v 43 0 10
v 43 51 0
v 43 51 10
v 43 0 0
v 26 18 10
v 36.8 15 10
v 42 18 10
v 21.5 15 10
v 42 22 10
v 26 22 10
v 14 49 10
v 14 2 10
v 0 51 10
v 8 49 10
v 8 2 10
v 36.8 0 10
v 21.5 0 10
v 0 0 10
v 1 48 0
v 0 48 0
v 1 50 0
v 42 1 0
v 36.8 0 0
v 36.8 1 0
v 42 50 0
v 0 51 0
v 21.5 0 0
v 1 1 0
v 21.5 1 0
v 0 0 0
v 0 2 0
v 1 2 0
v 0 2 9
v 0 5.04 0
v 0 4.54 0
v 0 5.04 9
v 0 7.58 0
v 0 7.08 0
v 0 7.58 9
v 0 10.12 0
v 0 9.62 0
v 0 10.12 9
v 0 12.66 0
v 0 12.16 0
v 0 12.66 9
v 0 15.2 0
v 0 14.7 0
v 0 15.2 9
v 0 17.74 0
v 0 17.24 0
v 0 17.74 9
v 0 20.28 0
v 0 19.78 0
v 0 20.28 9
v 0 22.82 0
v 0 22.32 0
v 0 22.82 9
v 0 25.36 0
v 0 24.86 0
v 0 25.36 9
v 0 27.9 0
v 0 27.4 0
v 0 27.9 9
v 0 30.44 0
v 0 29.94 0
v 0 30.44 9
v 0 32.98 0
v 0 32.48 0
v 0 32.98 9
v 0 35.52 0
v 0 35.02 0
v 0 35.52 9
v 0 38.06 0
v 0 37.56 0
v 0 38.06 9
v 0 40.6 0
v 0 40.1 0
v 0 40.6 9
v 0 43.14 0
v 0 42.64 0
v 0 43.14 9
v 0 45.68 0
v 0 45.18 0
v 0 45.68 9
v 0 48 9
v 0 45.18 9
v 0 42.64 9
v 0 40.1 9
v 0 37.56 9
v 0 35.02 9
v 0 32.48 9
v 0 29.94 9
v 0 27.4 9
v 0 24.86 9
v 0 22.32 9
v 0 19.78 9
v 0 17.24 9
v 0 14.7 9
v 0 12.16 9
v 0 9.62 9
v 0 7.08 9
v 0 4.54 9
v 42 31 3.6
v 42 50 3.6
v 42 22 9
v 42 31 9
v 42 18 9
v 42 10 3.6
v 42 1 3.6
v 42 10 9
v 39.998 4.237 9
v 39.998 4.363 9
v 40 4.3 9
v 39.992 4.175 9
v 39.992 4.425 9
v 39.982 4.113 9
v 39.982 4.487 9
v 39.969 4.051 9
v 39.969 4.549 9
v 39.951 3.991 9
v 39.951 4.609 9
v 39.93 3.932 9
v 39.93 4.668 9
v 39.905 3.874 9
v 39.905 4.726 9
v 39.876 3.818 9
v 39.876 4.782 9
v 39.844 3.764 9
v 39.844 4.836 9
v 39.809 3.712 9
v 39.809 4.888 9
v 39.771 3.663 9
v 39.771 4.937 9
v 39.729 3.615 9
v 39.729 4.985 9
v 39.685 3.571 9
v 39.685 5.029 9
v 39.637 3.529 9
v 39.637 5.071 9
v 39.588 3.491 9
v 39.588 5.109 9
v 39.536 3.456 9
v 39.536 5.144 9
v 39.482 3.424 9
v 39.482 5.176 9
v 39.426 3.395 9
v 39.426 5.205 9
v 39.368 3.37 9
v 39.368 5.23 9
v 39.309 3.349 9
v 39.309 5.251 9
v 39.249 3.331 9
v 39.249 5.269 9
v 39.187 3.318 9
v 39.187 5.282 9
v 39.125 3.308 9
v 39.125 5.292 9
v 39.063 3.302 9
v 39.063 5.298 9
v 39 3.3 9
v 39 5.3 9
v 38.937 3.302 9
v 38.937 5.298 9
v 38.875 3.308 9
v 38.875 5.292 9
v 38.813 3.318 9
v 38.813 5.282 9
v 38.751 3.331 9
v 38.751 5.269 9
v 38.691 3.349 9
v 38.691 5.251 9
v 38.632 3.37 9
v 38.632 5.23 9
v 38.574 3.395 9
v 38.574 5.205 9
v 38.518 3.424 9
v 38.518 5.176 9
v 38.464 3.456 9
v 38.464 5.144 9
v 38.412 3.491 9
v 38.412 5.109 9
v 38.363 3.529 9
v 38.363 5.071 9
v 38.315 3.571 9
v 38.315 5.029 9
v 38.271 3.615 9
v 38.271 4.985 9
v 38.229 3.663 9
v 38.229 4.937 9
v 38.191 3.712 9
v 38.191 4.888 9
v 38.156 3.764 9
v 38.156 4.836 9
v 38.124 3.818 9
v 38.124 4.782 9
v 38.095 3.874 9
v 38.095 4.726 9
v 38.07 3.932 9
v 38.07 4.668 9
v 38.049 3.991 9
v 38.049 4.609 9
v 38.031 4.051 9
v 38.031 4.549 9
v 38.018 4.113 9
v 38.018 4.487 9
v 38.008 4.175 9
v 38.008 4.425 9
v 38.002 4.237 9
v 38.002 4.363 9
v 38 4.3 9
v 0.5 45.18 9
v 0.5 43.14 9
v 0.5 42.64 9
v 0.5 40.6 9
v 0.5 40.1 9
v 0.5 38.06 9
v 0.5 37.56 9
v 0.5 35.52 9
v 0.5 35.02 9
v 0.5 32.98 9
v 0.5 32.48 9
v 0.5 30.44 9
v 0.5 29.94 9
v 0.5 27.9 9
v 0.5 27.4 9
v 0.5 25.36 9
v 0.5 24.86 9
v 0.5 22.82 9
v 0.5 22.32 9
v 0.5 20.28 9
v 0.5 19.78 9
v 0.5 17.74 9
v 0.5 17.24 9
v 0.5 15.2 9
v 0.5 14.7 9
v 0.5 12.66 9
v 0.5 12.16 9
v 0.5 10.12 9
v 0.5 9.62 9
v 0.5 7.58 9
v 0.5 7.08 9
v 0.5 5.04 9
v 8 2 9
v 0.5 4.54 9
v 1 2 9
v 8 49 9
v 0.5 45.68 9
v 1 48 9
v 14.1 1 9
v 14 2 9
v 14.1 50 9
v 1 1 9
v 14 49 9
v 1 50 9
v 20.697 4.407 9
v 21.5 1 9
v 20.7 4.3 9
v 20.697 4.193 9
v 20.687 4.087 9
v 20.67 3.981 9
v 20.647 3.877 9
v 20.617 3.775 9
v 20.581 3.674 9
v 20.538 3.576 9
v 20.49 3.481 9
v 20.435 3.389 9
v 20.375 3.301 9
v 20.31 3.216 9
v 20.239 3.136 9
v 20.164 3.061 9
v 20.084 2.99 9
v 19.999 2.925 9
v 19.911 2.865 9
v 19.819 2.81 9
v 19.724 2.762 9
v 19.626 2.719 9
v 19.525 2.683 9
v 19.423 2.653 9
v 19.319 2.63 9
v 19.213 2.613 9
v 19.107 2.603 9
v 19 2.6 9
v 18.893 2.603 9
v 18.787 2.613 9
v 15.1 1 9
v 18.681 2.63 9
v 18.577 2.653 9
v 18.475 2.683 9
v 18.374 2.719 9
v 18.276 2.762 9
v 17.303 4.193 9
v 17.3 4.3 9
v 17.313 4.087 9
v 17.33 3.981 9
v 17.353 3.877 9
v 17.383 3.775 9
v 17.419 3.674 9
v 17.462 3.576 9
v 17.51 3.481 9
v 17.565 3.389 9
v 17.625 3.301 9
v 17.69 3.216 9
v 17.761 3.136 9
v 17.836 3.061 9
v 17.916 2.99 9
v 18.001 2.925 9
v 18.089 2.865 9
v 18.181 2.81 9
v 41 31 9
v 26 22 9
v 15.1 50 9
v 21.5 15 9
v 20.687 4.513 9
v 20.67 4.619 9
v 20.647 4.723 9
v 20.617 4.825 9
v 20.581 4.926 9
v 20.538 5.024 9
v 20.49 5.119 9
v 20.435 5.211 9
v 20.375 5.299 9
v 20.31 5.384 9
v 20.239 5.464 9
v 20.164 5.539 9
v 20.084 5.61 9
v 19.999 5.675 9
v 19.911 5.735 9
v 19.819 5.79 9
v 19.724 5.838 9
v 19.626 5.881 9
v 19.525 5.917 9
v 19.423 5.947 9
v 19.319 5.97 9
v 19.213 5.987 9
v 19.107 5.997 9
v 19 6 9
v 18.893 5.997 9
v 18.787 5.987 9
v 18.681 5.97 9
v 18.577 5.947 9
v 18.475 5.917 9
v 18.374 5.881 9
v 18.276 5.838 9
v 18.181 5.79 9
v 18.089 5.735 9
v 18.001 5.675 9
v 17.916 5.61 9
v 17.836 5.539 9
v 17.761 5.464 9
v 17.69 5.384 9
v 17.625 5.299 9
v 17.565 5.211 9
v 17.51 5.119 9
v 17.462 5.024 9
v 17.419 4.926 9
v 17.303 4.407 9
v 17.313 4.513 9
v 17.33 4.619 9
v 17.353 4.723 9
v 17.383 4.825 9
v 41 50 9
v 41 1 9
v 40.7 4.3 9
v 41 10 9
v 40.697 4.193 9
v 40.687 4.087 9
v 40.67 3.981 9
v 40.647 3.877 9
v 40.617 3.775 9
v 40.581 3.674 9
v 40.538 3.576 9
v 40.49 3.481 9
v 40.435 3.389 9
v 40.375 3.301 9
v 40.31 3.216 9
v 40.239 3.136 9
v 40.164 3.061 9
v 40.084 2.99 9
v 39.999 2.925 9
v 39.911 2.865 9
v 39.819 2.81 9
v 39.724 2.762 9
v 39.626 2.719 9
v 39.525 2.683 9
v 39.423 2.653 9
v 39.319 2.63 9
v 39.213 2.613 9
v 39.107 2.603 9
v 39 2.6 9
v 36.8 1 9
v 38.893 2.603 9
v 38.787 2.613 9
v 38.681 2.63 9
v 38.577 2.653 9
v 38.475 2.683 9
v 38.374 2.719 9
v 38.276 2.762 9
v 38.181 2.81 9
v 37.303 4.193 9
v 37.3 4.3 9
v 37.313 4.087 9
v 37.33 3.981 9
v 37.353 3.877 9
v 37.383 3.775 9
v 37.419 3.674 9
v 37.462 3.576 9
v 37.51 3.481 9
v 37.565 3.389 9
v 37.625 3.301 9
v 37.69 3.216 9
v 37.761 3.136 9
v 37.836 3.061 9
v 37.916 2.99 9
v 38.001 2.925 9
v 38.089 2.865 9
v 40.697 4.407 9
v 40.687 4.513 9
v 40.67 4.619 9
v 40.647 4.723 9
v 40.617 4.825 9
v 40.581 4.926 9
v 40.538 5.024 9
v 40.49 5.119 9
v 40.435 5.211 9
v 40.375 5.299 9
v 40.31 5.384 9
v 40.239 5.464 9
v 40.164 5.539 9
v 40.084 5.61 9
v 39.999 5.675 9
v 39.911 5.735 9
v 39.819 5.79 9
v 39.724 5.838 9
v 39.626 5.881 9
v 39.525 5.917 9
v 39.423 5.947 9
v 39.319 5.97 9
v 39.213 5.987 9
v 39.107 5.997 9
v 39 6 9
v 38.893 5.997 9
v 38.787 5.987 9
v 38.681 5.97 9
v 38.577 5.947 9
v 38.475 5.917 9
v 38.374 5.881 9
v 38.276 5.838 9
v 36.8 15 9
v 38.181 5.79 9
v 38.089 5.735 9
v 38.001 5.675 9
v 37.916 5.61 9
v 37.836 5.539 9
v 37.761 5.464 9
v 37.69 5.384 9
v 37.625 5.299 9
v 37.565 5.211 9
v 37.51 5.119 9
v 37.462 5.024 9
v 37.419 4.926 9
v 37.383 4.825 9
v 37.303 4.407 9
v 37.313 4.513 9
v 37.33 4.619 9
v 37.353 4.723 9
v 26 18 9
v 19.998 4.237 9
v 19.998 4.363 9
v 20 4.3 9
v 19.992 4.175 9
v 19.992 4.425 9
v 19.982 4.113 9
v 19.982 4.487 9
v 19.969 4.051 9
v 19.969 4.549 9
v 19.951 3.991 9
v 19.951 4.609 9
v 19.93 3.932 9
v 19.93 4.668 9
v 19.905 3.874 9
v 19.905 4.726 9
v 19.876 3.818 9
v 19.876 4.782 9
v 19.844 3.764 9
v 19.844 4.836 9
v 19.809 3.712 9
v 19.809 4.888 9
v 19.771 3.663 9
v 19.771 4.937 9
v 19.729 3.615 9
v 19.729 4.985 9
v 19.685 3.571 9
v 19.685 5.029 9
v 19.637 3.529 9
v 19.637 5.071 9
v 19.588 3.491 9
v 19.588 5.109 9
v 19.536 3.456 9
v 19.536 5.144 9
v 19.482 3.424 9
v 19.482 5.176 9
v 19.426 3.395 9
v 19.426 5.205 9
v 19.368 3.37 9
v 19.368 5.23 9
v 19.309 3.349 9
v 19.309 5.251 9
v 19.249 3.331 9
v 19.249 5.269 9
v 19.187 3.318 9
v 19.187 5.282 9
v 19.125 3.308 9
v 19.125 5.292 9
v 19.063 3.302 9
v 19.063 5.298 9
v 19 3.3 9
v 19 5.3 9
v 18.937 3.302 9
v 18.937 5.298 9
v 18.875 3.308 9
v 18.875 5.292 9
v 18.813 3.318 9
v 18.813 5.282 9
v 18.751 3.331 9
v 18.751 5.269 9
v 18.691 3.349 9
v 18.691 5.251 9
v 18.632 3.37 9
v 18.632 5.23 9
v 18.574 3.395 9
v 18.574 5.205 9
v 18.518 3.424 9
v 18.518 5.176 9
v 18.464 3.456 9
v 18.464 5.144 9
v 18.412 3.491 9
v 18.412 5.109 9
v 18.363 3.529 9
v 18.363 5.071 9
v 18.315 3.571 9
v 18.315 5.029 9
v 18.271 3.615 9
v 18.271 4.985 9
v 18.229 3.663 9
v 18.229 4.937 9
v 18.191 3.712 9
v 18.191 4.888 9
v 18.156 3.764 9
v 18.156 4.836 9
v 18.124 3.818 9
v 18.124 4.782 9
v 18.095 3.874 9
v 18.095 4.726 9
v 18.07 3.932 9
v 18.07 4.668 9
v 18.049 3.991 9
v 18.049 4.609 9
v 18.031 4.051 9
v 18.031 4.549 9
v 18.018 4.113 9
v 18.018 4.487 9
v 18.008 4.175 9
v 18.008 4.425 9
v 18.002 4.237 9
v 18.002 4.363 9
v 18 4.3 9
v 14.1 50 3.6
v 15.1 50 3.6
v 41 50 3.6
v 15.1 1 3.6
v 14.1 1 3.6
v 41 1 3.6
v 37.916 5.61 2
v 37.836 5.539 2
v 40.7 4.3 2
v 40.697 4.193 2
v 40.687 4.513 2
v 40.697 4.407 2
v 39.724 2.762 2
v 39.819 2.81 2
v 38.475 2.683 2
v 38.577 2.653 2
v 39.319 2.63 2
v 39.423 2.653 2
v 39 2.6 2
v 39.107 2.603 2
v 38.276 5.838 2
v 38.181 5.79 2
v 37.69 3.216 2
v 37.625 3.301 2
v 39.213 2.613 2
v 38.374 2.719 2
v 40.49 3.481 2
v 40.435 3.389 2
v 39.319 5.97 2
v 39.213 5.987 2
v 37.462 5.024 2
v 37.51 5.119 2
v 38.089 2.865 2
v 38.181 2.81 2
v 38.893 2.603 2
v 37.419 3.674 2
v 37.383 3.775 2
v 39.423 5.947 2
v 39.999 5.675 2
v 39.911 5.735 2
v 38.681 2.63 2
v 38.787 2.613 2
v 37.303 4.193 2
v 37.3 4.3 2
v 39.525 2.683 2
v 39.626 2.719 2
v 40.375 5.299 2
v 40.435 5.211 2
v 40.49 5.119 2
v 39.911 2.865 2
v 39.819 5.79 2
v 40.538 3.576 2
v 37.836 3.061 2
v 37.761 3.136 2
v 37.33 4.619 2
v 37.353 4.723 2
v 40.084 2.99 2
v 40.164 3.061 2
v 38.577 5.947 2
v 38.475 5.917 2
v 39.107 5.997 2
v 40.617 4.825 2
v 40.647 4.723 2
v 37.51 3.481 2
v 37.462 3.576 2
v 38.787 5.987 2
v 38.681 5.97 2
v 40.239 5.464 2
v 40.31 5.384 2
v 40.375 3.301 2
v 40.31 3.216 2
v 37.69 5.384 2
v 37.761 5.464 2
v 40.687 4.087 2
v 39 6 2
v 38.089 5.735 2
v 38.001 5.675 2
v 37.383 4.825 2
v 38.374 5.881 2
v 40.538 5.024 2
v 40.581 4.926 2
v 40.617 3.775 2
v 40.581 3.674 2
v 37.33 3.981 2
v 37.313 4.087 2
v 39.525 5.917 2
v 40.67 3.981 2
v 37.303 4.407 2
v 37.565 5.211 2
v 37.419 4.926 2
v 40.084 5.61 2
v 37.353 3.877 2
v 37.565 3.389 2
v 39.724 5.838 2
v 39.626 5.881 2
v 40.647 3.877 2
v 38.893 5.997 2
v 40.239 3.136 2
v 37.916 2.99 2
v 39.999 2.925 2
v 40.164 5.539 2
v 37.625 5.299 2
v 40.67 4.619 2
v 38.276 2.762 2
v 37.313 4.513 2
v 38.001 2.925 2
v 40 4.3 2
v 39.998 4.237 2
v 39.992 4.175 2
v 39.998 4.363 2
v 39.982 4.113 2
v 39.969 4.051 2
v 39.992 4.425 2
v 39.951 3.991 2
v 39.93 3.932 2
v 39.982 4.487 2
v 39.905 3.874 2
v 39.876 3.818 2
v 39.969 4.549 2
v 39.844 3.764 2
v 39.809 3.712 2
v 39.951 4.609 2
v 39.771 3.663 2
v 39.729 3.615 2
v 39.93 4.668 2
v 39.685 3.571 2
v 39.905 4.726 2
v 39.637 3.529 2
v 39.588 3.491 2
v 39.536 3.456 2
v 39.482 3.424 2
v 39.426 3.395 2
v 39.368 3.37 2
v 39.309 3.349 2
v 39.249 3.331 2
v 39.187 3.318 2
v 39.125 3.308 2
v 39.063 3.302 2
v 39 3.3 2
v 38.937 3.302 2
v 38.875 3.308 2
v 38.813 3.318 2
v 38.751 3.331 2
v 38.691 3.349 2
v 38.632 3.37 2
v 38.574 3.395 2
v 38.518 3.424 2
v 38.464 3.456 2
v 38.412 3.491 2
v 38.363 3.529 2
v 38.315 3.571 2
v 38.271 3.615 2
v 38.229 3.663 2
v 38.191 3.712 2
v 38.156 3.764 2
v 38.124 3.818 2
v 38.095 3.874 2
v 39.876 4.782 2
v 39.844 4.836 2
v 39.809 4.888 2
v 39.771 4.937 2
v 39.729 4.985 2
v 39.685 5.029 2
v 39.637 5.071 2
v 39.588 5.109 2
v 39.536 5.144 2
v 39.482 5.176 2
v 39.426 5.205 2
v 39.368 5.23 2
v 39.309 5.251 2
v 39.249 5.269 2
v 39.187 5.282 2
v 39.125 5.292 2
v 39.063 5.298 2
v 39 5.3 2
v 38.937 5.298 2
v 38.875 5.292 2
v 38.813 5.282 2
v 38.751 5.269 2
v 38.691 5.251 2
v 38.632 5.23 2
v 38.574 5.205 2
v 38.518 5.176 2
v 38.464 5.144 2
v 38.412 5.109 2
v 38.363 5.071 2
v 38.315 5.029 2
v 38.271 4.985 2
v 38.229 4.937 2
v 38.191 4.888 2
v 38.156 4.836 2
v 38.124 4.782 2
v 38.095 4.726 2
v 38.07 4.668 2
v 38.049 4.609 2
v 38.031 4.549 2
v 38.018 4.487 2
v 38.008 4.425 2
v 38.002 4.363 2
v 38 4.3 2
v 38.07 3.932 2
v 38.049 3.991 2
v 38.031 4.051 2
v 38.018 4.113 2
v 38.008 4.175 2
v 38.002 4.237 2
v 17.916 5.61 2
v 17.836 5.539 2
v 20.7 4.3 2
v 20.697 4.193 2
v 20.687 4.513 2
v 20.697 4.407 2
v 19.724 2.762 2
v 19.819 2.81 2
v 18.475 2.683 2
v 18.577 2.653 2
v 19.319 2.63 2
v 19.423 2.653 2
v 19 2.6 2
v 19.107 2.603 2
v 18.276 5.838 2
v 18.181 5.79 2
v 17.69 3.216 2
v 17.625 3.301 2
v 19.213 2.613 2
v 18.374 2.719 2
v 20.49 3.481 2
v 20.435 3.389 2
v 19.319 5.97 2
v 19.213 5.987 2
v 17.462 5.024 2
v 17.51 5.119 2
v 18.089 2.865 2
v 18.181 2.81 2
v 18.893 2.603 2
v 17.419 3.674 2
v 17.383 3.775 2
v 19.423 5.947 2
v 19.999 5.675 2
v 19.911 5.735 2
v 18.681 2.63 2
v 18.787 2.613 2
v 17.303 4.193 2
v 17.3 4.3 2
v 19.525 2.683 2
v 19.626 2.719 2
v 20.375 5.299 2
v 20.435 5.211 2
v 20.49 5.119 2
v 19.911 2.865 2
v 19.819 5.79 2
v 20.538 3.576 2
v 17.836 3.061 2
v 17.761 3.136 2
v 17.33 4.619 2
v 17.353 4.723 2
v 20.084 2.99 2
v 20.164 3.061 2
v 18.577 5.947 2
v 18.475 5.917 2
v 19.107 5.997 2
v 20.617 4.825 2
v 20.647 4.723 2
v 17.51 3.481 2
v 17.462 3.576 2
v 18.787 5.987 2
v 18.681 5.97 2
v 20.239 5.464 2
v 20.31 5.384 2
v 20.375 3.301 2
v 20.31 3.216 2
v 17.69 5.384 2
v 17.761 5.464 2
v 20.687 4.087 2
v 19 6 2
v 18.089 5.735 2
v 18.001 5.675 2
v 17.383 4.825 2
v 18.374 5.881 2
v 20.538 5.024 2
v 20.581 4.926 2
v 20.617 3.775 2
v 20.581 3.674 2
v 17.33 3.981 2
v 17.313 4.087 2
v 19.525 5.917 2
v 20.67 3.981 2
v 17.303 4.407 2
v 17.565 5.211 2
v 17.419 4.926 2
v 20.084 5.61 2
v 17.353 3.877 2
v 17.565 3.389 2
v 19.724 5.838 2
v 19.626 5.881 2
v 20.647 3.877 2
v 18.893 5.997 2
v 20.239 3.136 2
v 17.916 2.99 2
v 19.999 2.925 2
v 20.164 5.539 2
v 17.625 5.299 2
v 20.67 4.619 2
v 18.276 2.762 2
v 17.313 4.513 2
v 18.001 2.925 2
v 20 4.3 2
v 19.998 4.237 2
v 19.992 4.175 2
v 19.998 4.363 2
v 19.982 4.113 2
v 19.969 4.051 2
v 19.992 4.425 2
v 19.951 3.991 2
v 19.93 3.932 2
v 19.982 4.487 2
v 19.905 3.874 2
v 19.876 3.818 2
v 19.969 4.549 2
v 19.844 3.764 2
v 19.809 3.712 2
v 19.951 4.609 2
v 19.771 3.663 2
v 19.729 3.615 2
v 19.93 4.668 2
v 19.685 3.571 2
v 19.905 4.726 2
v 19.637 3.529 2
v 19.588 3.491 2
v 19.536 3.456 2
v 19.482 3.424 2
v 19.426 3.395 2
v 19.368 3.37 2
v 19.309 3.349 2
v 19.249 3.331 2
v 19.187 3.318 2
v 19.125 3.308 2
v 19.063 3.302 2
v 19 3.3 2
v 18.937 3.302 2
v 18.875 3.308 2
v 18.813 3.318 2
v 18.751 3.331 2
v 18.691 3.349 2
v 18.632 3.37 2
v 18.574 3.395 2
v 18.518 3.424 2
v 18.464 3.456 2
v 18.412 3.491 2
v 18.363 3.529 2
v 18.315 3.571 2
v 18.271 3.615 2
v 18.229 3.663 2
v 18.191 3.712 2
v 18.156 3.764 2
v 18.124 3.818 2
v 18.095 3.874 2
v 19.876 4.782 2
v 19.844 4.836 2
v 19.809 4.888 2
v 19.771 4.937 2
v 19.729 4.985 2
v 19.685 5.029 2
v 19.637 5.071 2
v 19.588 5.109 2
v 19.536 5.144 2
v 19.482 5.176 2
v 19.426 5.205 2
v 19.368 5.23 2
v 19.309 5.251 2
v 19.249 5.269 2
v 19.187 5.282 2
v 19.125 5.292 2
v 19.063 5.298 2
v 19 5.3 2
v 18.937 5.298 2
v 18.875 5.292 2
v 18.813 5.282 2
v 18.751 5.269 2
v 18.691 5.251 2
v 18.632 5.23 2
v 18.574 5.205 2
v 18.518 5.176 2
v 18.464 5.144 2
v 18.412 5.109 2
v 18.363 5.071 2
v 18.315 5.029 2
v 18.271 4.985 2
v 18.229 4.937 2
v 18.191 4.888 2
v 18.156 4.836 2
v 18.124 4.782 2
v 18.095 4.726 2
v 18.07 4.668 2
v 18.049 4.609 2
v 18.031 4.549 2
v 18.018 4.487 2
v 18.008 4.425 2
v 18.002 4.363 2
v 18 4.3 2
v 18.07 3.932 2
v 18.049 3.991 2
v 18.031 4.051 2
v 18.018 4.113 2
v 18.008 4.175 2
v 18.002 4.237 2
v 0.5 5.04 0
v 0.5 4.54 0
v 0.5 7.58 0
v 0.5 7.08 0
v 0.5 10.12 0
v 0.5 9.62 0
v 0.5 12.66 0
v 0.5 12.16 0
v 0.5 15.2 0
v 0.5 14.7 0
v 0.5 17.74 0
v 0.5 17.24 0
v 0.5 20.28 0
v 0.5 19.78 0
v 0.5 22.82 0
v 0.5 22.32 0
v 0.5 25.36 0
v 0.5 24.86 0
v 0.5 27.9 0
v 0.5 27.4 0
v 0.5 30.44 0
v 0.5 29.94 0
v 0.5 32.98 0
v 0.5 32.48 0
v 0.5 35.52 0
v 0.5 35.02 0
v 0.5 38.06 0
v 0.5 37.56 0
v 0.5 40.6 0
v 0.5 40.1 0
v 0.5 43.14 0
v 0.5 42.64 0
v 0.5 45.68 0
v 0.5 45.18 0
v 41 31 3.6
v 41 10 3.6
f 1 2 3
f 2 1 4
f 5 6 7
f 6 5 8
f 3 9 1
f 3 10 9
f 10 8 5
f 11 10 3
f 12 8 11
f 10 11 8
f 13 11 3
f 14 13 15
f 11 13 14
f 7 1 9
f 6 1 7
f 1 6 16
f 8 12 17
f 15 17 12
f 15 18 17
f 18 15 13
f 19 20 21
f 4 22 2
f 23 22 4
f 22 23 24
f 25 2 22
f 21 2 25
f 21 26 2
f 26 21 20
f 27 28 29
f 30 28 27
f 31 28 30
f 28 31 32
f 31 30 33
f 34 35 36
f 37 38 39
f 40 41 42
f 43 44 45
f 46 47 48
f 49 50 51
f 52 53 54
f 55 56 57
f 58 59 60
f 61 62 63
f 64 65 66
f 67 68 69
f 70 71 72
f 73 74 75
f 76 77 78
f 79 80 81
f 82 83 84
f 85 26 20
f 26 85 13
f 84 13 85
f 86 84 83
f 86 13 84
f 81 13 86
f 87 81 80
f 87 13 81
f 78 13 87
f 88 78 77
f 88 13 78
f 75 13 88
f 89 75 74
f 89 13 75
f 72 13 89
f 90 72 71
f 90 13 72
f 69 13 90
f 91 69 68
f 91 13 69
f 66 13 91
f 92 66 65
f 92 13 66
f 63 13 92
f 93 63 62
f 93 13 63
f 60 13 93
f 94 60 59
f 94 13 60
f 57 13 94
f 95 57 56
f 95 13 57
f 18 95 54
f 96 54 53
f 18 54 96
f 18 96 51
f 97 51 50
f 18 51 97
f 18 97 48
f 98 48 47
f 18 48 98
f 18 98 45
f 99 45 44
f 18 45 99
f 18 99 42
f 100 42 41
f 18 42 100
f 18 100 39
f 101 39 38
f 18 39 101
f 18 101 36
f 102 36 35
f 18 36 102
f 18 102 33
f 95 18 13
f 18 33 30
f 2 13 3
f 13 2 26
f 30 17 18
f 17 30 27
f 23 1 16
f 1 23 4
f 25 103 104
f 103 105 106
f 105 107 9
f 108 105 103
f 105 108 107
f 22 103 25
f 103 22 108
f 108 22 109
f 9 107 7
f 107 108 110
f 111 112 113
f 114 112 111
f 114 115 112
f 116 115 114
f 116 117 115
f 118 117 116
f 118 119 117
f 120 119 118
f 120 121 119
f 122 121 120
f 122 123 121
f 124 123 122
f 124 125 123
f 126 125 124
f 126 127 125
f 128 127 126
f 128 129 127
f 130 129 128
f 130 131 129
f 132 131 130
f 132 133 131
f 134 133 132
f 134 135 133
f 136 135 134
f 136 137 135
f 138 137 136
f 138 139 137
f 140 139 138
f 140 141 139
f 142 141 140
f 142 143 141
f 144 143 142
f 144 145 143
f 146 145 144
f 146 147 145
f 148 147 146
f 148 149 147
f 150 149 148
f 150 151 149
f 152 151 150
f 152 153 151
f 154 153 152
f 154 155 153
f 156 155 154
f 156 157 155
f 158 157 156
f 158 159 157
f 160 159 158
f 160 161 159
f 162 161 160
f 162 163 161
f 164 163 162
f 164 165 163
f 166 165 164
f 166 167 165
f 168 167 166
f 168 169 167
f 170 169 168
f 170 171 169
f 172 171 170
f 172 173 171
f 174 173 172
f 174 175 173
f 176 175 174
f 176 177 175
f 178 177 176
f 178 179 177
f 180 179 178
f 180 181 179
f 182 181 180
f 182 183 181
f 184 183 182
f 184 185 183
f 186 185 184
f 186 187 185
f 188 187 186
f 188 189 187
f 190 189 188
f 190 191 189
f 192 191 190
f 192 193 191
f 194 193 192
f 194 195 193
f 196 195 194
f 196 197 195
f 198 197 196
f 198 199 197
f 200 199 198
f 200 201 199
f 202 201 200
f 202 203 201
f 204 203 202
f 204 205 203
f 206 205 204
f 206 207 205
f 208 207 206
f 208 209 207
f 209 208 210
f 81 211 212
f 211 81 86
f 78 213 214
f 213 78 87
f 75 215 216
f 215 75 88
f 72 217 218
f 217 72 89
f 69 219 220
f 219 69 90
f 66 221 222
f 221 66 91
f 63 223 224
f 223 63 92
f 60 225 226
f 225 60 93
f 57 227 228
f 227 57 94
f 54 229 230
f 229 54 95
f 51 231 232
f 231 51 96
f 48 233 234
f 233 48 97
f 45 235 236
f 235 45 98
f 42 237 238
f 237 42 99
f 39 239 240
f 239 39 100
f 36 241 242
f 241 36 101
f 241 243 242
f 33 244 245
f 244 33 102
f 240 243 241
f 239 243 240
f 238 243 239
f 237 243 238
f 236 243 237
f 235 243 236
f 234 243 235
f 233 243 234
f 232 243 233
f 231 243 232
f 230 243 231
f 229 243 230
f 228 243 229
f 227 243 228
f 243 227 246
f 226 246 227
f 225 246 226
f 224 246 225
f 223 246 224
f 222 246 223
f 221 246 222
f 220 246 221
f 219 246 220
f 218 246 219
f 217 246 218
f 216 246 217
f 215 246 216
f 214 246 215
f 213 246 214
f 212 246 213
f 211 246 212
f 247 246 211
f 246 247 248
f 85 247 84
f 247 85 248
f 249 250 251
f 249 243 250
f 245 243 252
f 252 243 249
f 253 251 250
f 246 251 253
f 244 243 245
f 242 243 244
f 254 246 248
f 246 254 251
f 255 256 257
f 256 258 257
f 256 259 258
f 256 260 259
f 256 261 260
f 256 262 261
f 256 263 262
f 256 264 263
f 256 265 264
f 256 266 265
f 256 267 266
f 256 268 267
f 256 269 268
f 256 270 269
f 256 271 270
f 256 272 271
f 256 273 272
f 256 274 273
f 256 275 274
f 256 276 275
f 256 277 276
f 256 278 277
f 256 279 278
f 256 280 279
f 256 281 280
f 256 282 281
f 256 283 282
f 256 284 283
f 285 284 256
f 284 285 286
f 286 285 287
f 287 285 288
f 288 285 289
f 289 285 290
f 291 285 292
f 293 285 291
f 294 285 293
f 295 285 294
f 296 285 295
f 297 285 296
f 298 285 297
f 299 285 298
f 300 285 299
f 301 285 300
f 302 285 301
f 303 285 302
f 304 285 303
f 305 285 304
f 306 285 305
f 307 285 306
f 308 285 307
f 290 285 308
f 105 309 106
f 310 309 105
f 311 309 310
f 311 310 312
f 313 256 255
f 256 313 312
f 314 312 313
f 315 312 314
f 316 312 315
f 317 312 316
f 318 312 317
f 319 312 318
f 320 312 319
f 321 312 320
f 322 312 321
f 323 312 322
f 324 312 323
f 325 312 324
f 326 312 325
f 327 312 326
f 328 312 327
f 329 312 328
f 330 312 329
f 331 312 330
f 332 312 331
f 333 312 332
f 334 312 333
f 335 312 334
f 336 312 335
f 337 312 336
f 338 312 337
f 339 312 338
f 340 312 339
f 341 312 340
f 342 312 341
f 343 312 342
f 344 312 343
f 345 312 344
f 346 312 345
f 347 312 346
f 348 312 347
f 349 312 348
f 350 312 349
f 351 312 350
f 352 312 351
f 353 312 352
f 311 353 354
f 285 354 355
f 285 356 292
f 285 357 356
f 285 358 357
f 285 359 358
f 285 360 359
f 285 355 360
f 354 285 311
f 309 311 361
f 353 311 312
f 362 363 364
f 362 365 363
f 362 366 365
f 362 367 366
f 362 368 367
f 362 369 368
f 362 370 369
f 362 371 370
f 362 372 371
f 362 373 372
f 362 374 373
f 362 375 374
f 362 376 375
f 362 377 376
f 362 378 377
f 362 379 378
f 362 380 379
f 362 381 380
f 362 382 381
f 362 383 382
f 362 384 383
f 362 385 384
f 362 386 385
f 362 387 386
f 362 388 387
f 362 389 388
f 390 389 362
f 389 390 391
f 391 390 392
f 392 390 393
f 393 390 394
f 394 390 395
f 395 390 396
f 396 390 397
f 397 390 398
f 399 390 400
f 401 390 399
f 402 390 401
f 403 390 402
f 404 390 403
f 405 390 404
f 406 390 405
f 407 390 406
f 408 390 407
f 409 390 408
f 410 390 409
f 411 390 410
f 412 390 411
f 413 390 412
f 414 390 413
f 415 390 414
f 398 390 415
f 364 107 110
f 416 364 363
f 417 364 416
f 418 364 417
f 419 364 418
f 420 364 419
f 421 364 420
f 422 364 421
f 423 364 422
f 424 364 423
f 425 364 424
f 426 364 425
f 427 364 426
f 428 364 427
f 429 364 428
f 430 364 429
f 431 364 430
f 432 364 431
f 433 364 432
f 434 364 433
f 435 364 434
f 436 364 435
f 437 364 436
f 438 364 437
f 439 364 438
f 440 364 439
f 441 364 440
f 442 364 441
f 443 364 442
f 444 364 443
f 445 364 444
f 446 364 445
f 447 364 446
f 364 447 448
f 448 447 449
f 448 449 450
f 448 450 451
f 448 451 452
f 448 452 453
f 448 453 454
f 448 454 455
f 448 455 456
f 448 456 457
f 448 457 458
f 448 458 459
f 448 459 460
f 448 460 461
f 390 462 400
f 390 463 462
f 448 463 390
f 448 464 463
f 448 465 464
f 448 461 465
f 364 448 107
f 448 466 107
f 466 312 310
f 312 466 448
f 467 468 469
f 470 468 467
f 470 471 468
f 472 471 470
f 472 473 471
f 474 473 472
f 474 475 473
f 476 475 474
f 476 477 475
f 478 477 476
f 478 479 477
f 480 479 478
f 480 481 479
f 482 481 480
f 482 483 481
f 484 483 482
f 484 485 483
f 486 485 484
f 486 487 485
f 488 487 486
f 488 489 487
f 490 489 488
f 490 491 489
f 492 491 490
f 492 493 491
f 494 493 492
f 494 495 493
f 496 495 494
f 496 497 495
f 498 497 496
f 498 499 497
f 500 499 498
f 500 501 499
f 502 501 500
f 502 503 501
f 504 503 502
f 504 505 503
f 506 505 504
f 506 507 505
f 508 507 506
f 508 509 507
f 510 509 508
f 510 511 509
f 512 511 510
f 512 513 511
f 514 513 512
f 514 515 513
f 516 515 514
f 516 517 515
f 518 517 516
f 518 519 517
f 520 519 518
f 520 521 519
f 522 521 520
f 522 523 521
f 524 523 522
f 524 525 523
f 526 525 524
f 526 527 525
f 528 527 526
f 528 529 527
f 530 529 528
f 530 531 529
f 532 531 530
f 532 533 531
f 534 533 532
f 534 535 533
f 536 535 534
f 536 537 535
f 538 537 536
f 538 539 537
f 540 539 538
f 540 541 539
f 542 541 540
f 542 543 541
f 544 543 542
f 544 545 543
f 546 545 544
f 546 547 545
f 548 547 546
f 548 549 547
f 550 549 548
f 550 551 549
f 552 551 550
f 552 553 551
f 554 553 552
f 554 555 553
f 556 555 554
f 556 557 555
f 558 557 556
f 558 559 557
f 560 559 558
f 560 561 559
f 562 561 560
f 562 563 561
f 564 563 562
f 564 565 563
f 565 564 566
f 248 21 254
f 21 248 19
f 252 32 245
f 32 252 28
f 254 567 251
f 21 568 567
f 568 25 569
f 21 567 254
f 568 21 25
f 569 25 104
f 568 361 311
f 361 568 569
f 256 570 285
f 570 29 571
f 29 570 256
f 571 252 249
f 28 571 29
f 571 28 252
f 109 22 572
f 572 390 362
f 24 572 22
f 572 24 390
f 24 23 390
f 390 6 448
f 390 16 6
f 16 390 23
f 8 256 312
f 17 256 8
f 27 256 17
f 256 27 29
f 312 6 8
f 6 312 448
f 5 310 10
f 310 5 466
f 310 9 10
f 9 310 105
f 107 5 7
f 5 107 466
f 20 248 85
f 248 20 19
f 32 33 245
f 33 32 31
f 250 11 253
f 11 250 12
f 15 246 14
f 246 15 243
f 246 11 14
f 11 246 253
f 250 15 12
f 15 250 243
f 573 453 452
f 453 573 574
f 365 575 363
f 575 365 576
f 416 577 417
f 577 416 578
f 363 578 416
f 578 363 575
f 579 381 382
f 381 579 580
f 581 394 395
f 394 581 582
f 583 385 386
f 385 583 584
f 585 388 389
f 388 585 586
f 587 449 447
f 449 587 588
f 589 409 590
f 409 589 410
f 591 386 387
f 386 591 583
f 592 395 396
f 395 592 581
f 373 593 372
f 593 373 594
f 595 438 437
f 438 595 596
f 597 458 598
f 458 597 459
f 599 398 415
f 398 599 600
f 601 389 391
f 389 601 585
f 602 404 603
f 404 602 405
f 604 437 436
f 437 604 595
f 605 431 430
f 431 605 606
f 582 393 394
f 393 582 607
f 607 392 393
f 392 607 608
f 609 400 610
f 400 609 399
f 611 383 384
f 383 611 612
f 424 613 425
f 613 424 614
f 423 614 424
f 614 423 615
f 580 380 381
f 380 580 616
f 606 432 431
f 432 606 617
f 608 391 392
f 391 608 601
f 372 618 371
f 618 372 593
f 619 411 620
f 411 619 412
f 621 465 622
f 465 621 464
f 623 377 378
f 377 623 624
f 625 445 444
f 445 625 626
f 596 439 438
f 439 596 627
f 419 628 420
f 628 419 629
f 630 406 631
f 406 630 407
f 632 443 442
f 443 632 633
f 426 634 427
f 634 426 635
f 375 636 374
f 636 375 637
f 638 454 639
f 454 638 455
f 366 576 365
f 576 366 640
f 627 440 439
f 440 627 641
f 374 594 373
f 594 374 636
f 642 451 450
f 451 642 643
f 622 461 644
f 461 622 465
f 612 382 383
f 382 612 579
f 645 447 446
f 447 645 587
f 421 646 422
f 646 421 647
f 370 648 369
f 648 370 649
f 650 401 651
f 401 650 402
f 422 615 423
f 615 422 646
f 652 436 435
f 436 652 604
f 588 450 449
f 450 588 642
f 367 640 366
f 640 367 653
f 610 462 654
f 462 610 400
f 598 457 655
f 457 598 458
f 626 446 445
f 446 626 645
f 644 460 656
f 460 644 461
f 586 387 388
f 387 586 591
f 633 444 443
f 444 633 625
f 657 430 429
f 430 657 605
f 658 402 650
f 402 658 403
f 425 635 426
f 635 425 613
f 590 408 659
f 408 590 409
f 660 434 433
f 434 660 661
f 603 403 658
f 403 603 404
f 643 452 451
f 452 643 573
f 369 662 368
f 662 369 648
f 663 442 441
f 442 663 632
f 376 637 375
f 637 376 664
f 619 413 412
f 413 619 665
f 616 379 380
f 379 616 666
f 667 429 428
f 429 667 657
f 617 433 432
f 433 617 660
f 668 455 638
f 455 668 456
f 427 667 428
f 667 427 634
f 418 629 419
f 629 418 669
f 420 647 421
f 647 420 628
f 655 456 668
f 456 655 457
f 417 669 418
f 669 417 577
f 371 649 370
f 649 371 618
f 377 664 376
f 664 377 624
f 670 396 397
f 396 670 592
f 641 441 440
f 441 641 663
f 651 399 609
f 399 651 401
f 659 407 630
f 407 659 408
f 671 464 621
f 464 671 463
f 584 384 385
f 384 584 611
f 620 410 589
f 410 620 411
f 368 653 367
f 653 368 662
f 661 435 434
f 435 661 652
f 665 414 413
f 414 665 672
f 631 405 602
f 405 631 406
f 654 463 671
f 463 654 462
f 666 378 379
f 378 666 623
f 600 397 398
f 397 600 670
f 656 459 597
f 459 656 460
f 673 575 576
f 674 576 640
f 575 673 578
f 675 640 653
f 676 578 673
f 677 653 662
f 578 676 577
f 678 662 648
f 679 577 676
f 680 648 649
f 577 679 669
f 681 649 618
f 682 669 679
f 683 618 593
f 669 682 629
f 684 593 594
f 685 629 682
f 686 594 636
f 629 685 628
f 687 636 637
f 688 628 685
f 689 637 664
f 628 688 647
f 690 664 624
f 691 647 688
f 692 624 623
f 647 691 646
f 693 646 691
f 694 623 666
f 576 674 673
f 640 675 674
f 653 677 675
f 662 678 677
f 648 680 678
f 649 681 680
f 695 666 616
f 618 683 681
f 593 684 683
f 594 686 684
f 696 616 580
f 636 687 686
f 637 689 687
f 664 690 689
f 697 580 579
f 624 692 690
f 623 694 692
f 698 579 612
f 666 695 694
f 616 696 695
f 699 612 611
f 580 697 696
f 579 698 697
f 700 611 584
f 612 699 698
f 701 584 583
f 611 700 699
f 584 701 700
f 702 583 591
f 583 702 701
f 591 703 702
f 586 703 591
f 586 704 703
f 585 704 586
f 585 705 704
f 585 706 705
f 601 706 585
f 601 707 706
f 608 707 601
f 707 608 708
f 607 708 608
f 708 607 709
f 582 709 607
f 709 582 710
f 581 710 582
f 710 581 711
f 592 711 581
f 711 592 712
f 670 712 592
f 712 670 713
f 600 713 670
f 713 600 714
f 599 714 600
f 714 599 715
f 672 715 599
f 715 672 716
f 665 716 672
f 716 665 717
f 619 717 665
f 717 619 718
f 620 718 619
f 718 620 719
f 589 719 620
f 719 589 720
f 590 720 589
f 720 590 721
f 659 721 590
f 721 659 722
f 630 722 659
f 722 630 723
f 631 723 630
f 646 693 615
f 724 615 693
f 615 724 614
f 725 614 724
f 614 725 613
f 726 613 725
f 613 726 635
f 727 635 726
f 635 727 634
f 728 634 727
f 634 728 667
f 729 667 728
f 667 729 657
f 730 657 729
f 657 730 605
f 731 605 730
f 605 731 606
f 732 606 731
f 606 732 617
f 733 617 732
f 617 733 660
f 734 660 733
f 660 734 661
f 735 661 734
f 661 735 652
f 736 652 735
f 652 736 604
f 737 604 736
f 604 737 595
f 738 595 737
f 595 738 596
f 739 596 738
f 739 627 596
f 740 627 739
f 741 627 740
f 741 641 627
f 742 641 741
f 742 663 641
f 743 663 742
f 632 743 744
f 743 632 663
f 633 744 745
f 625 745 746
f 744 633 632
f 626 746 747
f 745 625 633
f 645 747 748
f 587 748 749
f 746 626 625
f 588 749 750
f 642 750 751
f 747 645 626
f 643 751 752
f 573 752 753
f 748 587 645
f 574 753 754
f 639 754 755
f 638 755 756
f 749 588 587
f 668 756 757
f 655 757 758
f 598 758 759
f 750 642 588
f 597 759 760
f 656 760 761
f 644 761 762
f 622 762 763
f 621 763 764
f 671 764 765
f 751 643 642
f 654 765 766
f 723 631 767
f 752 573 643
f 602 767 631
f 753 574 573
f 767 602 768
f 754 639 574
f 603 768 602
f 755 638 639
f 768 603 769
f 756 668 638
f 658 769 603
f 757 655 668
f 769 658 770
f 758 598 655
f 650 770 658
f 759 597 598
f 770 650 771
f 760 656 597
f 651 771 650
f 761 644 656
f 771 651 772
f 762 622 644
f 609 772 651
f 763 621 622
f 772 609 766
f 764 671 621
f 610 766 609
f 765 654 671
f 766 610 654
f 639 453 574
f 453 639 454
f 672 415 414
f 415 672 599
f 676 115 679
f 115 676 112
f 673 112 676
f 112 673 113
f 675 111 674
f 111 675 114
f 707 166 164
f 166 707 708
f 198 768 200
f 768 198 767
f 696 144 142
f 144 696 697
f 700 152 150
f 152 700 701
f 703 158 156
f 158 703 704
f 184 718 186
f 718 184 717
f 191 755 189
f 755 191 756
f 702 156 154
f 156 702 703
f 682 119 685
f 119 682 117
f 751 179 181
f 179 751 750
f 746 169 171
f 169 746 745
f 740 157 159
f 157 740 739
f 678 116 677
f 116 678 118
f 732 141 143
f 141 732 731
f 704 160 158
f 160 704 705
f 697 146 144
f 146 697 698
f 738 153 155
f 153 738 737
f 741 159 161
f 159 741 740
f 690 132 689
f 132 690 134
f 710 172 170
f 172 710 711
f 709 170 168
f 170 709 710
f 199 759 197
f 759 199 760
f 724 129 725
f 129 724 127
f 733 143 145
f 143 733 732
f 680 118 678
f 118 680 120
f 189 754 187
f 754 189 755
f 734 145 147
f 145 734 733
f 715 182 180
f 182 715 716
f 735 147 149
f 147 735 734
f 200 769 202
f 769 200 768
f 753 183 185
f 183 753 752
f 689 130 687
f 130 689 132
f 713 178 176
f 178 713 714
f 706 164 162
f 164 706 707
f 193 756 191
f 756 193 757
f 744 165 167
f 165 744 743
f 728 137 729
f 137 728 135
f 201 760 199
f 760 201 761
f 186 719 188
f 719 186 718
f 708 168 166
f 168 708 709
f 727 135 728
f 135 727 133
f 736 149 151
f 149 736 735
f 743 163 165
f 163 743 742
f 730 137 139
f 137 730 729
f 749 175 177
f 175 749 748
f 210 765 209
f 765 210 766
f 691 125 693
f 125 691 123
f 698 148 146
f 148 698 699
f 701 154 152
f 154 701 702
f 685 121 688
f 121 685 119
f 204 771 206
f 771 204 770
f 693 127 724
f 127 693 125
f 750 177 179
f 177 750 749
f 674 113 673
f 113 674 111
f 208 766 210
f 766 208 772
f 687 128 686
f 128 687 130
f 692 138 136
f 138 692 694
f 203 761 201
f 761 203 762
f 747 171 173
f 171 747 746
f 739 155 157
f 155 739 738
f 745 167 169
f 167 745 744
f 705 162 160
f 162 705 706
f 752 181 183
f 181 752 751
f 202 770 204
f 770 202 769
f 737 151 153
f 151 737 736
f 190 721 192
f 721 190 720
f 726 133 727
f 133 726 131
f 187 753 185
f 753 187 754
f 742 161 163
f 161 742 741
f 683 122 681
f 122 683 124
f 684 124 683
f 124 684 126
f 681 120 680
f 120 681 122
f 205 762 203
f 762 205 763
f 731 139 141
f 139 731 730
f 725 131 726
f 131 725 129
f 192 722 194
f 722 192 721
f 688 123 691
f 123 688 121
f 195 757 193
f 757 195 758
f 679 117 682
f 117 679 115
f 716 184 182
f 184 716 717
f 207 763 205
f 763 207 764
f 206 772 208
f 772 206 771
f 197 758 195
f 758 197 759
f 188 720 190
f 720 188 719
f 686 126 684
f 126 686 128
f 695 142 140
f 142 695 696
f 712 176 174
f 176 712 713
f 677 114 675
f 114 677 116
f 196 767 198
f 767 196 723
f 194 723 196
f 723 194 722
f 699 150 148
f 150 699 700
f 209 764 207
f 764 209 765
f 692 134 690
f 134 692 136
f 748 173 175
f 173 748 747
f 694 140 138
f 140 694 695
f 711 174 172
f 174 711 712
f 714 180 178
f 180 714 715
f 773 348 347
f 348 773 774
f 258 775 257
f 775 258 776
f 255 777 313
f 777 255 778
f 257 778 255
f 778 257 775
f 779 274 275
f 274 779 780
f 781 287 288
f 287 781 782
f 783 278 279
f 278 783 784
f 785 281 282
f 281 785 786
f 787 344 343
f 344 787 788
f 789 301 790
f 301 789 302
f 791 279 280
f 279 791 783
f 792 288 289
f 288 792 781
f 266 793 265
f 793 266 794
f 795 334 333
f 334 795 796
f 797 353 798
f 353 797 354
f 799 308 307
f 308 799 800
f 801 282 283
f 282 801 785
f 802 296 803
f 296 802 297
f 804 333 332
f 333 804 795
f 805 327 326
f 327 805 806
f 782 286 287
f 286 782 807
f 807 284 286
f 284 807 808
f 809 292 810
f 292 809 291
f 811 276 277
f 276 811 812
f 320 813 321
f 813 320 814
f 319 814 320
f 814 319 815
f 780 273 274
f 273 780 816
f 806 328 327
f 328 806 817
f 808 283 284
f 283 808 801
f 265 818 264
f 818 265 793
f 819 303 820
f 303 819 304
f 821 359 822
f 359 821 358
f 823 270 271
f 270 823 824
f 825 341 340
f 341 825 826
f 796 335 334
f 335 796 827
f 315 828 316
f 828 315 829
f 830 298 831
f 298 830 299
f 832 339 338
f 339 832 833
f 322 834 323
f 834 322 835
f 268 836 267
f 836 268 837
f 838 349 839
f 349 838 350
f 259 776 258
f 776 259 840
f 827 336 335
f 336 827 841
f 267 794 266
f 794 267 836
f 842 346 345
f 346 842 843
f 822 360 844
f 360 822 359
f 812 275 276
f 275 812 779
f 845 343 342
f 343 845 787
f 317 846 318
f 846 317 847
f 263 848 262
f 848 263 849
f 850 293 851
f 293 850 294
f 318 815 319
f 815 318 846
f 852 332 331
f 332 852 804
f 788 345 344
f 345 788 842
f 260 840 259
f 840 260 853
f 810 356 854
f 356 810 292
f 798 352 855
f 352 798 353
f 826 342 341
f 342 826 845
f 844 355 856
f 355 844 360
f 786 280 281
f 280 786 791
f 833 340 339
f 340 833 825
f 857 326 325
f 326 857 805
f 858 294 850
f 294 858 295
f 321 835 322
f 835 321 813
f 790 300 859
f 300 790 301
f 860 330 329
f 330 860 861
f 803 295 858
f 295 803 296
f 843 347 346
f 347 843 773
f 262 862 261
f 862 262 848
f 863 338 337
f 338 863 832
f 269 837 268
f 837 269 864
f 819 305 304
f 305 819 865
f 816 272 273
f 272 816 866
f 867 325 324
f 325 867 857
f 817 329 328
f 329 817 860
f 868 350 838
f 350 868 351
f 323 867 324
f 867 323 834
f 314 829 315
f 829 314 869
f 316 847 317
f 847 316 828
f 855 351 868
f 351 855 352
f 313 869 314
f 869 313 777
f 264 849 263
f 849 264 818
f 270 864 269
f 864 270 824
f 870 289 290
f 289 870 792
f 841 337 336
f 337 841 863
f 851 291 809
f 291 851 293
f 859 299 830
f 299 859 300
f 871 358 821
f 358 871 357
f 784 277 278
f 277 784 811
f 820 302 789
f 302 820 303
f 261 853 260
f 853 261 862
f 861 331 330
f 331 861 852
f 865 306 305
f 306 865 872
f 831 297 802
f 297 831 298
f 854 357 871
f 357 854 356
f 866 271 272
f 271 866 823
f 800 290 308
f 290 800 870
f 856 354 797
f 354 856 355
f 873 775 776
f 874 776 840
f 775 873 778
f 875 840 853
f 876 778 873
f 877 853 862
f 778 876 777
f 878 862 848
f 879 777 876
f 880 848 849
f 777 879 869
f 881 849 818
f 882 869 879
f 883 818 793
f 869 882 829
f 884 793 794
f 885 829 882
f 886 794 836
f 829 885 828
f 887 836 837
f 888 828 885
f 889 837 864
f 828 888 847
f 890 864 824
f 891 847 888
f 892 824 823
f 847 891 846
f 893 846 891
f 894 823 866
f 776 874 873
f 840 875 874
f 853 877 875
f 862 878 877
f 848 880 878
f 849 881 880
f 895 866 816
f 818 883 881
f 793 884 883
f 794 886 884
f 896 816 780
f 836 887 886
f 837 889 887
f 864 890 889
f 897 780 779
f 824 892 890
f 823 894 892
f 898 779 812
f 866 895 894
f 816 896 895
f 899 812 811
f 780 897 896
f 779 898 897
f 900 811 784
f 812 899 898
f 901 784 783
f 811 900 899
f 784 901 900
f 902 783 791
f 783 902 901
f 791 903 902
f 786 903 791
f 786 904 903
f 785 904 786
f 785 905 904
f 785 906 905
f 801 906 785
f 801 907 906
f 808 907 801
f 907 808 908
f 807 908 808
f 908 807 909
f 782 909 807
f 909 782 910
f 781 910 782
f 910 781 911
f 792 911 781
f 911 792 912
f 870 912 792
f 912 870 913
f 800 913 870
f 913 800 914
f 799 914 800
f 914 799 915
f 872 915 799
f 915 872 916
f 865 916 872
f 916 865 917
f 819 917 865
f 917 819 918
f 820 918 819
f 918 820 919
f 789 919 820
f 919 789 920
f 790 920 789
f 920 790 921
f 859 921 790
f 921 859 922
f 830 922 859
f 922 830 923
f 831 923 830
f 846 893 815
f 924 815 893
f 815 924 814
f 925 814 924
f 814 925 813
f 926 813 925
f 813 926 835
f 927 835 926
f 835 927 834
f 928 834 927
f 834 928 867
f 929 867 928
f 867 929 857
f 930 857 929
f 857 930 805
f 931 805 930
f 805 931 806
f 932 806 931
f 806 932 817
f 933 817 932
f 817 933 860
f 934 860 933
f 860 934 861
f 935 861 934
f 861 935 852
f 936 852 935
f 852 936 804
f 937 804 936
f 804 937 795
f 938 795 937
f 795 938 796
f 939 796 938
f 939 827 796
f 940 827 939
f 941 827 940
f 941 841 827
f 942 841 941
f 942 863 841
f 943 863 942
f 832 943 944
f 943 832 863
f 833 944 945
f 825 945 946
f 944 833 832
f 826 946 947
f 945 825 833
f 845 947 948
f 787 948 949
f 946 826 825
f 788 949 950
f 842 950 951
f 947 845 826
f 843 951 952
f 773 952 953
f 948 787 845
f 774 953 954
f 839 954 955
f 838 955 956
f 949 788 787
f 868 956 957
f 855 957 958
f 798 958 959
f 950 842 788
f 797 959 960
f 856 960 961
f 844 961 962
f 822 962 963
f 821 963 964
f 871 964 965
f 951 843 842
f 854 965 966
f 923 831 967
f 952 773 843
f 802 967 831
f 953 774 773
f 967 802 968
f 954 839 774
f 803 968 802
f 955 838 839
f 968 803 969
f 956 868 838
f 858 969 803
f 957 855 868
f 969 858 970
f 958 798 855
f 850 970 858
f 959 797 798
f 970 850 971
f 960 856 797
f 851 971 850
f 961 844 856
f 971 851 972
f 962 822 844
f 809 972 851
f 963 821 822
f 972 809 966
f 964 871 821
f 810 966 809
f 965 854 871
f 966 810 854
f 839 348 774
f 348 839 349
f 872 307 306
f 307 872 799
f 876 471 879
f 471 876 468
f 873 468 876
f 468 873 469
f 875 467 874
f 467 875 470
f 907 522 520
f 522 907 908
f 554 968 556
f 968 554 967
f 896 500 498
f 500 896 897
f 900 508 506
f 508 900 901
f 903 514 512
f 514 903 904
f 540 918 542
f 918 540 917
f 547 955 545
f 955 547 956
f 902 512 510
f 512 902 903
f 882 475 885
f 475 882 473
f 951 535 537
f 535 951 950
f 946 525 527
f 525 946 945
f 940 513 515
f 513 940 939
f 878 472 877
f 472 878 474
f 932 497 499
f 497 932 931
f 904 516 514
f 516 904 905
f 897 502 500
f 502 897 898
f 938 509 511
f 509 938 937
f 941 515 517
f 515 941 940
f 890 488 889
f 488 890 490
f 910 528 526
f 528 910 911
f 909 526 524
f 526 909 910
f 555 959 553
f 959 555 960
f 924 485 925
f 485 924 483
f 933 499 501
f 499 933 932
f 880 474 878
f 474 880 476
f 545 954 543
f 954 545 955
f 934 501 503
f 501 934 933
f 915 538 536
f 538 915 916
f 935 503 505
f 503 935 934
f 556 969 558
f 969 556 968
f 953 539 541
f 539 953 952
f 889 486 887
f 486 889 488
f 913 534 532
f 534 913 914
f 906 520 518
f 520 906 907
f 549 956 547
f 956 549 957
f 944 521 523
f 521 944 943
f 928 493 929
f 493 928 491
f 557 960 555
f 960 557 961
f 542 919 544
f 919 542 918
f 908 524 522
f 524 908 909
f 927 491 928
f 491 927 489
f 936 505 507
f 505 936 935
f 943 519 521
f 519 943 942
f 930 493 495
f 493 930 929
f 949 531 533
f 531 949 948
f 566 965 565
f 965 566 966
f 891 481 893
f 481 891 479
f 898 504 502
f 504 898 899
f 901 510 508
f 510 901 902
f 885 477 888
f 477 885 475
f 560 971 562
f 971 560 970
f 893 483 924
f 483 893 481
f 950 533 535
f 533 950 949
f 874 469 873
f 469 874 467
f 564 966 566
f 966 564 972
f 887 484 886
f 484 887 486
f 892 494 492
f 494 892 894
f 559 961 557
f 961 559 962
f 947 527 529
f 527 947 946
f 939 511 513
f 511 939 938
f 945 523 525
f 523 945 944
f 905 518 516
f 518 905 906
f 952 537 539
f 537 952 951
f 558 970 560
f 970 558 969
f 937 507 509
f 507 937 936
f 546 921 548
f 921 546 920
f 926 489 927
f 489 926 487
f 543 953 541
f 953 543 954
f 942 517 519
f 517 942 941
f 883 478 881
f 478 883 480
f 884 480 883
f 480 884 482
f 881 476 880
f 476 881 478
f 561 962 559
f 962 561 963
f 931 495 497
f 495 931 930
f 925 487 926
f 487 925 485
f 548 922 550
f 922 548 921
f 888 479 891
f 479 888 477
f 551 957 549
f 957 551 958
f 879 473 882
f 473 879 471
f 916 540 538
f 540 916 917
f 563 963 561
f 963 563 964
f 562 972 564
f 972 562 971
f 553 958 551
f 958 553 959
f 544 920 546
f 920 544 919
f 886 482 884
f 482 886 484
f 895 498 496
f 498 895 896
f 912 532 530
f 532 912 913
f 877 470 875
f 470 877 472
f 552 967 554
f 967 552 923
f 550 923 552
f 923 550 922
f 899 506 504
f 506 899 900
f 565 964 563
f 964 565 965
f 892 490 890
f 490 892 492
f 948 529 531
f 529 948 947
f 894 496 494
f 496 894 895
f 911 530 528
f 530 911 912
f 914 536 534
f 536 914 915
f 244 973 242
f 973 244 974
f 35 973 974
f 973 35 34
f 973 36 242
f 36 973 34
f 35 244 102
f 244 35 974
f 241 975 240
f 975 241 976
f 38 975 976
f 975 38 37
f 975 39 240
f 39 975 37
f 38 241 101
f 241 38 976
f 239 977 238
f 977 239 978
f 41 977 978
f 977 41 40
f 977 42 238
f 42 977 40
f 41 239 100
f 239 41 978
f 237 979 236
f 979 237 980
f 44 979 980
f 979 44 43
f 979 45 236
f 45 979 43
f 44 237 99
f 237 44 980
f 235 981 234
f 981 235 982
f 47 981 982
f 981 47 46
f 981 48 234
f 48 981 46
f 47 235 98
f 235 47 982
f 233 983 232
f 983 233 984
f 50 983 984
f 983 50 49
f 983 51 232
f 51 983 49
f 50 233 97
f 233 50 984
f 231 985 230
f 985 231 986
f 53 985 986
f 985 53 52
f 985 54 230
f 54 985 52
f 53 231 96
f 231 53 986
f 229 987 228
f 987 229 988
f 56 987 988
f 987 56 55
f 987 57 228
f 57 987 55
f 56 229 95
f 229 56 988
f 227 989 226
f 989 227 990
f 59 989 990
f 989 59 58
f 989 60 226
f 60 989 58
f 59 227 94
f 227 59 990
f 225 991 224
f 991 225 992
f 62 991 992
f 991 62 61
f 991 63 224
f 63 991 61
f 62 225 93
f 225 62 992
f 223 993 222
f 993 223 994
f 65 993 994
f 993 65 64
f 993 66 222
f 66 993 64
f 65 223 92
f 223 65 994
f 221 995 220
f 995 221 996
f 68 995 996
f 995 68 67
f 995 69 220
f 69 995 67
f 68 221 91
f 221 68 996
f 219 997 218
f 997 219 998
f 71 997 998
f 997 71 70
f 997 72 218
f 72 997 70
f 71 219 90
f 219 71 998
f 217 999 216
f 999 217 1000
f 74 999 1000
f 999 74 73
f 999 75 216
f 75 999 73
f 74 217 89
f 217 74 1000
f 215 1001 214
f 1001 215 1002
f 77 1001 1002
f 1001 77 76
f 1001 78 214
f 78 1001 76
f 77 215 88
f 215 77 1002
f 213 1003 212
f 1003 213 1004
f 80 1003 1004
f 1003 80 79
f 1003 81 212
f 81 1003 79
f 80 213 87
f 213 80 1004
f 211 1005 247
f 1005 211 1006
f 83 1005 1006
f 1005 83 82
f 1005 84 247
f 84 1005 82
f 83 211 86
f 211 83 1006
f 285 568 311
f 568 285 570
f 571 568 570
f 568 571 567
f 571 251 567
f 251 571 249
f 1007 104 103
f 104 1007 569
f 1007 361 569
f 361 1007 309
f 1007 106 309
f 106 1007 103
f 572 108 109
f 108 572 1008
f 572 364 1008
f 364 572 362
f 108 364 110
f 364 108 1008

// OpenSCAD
//长度
Lenght=51;
//宽度
Width=43;
//高度
Height=10;
//墙壁厚度
Thickness=1;
$fn = 100;
//自攻螺丝孔 参数:高度,半径,螺丝半径
module ScrewHole(height,r,screwr)
{
	difference()
	{
		cylinder(height,r=r, center=false);
		cylinder(height-1,r=screwr, center=false);
	};
}

union()
{
	difference()
	{
		cube([Width,Lenght,Height]);
		translate([Thickness,Thickness,0]) cube([Width-Thickness*2,Lenght-Thickness*2,Height-Thickness]);
		//USBPort
		translate([Width-(20.5+Thickness),0,0]) cube([15.3,15,10]);
		//DebugPort
		translate([Width-((4*4)+Thickness),18,0]) cube([4*4,4,Height]);
		//GPIO1
		translate([0,Thickness*2,0]) cube([Thickness,Lenght-(Thickness*2)-3,Height-Thickness]);
		//GPIO2
		translate([Thickness+7,Thickness+1,Thickness]) cube([6,Lenght-(Thickness*2)-2,Height]);
	}
	// */
	//定位螺丝口
	translate([Width-(3+Thickness),4.3,Height-8]) ScrewHole(8,1.7, 1);
	//定位螺丝口
	translate([Width-(23+Thickness),4.3,Height-8]) ScrewHole(8,1.7, 1);
	//支撑柱
	for(i=[1:17])translate([0,2+(2.54*i),0]) cube([0.5,0.5,Height]);
    //支撑1
    translate([Thickness+13.1,0,Height-6.4])cube([1,Lenght,6.4]);
    //支撑2
    translate([Width-2,Lenght-20,Height-6.4])cube([1,20,6.4]);
    //支撑3
    translate([Width-2,0,Height-6.4])cube([1,10,6.4]);
}

//translate([Width-(20.5+Thickness),17.5,Height*2]) cube([10.5,3,Thickness]);
